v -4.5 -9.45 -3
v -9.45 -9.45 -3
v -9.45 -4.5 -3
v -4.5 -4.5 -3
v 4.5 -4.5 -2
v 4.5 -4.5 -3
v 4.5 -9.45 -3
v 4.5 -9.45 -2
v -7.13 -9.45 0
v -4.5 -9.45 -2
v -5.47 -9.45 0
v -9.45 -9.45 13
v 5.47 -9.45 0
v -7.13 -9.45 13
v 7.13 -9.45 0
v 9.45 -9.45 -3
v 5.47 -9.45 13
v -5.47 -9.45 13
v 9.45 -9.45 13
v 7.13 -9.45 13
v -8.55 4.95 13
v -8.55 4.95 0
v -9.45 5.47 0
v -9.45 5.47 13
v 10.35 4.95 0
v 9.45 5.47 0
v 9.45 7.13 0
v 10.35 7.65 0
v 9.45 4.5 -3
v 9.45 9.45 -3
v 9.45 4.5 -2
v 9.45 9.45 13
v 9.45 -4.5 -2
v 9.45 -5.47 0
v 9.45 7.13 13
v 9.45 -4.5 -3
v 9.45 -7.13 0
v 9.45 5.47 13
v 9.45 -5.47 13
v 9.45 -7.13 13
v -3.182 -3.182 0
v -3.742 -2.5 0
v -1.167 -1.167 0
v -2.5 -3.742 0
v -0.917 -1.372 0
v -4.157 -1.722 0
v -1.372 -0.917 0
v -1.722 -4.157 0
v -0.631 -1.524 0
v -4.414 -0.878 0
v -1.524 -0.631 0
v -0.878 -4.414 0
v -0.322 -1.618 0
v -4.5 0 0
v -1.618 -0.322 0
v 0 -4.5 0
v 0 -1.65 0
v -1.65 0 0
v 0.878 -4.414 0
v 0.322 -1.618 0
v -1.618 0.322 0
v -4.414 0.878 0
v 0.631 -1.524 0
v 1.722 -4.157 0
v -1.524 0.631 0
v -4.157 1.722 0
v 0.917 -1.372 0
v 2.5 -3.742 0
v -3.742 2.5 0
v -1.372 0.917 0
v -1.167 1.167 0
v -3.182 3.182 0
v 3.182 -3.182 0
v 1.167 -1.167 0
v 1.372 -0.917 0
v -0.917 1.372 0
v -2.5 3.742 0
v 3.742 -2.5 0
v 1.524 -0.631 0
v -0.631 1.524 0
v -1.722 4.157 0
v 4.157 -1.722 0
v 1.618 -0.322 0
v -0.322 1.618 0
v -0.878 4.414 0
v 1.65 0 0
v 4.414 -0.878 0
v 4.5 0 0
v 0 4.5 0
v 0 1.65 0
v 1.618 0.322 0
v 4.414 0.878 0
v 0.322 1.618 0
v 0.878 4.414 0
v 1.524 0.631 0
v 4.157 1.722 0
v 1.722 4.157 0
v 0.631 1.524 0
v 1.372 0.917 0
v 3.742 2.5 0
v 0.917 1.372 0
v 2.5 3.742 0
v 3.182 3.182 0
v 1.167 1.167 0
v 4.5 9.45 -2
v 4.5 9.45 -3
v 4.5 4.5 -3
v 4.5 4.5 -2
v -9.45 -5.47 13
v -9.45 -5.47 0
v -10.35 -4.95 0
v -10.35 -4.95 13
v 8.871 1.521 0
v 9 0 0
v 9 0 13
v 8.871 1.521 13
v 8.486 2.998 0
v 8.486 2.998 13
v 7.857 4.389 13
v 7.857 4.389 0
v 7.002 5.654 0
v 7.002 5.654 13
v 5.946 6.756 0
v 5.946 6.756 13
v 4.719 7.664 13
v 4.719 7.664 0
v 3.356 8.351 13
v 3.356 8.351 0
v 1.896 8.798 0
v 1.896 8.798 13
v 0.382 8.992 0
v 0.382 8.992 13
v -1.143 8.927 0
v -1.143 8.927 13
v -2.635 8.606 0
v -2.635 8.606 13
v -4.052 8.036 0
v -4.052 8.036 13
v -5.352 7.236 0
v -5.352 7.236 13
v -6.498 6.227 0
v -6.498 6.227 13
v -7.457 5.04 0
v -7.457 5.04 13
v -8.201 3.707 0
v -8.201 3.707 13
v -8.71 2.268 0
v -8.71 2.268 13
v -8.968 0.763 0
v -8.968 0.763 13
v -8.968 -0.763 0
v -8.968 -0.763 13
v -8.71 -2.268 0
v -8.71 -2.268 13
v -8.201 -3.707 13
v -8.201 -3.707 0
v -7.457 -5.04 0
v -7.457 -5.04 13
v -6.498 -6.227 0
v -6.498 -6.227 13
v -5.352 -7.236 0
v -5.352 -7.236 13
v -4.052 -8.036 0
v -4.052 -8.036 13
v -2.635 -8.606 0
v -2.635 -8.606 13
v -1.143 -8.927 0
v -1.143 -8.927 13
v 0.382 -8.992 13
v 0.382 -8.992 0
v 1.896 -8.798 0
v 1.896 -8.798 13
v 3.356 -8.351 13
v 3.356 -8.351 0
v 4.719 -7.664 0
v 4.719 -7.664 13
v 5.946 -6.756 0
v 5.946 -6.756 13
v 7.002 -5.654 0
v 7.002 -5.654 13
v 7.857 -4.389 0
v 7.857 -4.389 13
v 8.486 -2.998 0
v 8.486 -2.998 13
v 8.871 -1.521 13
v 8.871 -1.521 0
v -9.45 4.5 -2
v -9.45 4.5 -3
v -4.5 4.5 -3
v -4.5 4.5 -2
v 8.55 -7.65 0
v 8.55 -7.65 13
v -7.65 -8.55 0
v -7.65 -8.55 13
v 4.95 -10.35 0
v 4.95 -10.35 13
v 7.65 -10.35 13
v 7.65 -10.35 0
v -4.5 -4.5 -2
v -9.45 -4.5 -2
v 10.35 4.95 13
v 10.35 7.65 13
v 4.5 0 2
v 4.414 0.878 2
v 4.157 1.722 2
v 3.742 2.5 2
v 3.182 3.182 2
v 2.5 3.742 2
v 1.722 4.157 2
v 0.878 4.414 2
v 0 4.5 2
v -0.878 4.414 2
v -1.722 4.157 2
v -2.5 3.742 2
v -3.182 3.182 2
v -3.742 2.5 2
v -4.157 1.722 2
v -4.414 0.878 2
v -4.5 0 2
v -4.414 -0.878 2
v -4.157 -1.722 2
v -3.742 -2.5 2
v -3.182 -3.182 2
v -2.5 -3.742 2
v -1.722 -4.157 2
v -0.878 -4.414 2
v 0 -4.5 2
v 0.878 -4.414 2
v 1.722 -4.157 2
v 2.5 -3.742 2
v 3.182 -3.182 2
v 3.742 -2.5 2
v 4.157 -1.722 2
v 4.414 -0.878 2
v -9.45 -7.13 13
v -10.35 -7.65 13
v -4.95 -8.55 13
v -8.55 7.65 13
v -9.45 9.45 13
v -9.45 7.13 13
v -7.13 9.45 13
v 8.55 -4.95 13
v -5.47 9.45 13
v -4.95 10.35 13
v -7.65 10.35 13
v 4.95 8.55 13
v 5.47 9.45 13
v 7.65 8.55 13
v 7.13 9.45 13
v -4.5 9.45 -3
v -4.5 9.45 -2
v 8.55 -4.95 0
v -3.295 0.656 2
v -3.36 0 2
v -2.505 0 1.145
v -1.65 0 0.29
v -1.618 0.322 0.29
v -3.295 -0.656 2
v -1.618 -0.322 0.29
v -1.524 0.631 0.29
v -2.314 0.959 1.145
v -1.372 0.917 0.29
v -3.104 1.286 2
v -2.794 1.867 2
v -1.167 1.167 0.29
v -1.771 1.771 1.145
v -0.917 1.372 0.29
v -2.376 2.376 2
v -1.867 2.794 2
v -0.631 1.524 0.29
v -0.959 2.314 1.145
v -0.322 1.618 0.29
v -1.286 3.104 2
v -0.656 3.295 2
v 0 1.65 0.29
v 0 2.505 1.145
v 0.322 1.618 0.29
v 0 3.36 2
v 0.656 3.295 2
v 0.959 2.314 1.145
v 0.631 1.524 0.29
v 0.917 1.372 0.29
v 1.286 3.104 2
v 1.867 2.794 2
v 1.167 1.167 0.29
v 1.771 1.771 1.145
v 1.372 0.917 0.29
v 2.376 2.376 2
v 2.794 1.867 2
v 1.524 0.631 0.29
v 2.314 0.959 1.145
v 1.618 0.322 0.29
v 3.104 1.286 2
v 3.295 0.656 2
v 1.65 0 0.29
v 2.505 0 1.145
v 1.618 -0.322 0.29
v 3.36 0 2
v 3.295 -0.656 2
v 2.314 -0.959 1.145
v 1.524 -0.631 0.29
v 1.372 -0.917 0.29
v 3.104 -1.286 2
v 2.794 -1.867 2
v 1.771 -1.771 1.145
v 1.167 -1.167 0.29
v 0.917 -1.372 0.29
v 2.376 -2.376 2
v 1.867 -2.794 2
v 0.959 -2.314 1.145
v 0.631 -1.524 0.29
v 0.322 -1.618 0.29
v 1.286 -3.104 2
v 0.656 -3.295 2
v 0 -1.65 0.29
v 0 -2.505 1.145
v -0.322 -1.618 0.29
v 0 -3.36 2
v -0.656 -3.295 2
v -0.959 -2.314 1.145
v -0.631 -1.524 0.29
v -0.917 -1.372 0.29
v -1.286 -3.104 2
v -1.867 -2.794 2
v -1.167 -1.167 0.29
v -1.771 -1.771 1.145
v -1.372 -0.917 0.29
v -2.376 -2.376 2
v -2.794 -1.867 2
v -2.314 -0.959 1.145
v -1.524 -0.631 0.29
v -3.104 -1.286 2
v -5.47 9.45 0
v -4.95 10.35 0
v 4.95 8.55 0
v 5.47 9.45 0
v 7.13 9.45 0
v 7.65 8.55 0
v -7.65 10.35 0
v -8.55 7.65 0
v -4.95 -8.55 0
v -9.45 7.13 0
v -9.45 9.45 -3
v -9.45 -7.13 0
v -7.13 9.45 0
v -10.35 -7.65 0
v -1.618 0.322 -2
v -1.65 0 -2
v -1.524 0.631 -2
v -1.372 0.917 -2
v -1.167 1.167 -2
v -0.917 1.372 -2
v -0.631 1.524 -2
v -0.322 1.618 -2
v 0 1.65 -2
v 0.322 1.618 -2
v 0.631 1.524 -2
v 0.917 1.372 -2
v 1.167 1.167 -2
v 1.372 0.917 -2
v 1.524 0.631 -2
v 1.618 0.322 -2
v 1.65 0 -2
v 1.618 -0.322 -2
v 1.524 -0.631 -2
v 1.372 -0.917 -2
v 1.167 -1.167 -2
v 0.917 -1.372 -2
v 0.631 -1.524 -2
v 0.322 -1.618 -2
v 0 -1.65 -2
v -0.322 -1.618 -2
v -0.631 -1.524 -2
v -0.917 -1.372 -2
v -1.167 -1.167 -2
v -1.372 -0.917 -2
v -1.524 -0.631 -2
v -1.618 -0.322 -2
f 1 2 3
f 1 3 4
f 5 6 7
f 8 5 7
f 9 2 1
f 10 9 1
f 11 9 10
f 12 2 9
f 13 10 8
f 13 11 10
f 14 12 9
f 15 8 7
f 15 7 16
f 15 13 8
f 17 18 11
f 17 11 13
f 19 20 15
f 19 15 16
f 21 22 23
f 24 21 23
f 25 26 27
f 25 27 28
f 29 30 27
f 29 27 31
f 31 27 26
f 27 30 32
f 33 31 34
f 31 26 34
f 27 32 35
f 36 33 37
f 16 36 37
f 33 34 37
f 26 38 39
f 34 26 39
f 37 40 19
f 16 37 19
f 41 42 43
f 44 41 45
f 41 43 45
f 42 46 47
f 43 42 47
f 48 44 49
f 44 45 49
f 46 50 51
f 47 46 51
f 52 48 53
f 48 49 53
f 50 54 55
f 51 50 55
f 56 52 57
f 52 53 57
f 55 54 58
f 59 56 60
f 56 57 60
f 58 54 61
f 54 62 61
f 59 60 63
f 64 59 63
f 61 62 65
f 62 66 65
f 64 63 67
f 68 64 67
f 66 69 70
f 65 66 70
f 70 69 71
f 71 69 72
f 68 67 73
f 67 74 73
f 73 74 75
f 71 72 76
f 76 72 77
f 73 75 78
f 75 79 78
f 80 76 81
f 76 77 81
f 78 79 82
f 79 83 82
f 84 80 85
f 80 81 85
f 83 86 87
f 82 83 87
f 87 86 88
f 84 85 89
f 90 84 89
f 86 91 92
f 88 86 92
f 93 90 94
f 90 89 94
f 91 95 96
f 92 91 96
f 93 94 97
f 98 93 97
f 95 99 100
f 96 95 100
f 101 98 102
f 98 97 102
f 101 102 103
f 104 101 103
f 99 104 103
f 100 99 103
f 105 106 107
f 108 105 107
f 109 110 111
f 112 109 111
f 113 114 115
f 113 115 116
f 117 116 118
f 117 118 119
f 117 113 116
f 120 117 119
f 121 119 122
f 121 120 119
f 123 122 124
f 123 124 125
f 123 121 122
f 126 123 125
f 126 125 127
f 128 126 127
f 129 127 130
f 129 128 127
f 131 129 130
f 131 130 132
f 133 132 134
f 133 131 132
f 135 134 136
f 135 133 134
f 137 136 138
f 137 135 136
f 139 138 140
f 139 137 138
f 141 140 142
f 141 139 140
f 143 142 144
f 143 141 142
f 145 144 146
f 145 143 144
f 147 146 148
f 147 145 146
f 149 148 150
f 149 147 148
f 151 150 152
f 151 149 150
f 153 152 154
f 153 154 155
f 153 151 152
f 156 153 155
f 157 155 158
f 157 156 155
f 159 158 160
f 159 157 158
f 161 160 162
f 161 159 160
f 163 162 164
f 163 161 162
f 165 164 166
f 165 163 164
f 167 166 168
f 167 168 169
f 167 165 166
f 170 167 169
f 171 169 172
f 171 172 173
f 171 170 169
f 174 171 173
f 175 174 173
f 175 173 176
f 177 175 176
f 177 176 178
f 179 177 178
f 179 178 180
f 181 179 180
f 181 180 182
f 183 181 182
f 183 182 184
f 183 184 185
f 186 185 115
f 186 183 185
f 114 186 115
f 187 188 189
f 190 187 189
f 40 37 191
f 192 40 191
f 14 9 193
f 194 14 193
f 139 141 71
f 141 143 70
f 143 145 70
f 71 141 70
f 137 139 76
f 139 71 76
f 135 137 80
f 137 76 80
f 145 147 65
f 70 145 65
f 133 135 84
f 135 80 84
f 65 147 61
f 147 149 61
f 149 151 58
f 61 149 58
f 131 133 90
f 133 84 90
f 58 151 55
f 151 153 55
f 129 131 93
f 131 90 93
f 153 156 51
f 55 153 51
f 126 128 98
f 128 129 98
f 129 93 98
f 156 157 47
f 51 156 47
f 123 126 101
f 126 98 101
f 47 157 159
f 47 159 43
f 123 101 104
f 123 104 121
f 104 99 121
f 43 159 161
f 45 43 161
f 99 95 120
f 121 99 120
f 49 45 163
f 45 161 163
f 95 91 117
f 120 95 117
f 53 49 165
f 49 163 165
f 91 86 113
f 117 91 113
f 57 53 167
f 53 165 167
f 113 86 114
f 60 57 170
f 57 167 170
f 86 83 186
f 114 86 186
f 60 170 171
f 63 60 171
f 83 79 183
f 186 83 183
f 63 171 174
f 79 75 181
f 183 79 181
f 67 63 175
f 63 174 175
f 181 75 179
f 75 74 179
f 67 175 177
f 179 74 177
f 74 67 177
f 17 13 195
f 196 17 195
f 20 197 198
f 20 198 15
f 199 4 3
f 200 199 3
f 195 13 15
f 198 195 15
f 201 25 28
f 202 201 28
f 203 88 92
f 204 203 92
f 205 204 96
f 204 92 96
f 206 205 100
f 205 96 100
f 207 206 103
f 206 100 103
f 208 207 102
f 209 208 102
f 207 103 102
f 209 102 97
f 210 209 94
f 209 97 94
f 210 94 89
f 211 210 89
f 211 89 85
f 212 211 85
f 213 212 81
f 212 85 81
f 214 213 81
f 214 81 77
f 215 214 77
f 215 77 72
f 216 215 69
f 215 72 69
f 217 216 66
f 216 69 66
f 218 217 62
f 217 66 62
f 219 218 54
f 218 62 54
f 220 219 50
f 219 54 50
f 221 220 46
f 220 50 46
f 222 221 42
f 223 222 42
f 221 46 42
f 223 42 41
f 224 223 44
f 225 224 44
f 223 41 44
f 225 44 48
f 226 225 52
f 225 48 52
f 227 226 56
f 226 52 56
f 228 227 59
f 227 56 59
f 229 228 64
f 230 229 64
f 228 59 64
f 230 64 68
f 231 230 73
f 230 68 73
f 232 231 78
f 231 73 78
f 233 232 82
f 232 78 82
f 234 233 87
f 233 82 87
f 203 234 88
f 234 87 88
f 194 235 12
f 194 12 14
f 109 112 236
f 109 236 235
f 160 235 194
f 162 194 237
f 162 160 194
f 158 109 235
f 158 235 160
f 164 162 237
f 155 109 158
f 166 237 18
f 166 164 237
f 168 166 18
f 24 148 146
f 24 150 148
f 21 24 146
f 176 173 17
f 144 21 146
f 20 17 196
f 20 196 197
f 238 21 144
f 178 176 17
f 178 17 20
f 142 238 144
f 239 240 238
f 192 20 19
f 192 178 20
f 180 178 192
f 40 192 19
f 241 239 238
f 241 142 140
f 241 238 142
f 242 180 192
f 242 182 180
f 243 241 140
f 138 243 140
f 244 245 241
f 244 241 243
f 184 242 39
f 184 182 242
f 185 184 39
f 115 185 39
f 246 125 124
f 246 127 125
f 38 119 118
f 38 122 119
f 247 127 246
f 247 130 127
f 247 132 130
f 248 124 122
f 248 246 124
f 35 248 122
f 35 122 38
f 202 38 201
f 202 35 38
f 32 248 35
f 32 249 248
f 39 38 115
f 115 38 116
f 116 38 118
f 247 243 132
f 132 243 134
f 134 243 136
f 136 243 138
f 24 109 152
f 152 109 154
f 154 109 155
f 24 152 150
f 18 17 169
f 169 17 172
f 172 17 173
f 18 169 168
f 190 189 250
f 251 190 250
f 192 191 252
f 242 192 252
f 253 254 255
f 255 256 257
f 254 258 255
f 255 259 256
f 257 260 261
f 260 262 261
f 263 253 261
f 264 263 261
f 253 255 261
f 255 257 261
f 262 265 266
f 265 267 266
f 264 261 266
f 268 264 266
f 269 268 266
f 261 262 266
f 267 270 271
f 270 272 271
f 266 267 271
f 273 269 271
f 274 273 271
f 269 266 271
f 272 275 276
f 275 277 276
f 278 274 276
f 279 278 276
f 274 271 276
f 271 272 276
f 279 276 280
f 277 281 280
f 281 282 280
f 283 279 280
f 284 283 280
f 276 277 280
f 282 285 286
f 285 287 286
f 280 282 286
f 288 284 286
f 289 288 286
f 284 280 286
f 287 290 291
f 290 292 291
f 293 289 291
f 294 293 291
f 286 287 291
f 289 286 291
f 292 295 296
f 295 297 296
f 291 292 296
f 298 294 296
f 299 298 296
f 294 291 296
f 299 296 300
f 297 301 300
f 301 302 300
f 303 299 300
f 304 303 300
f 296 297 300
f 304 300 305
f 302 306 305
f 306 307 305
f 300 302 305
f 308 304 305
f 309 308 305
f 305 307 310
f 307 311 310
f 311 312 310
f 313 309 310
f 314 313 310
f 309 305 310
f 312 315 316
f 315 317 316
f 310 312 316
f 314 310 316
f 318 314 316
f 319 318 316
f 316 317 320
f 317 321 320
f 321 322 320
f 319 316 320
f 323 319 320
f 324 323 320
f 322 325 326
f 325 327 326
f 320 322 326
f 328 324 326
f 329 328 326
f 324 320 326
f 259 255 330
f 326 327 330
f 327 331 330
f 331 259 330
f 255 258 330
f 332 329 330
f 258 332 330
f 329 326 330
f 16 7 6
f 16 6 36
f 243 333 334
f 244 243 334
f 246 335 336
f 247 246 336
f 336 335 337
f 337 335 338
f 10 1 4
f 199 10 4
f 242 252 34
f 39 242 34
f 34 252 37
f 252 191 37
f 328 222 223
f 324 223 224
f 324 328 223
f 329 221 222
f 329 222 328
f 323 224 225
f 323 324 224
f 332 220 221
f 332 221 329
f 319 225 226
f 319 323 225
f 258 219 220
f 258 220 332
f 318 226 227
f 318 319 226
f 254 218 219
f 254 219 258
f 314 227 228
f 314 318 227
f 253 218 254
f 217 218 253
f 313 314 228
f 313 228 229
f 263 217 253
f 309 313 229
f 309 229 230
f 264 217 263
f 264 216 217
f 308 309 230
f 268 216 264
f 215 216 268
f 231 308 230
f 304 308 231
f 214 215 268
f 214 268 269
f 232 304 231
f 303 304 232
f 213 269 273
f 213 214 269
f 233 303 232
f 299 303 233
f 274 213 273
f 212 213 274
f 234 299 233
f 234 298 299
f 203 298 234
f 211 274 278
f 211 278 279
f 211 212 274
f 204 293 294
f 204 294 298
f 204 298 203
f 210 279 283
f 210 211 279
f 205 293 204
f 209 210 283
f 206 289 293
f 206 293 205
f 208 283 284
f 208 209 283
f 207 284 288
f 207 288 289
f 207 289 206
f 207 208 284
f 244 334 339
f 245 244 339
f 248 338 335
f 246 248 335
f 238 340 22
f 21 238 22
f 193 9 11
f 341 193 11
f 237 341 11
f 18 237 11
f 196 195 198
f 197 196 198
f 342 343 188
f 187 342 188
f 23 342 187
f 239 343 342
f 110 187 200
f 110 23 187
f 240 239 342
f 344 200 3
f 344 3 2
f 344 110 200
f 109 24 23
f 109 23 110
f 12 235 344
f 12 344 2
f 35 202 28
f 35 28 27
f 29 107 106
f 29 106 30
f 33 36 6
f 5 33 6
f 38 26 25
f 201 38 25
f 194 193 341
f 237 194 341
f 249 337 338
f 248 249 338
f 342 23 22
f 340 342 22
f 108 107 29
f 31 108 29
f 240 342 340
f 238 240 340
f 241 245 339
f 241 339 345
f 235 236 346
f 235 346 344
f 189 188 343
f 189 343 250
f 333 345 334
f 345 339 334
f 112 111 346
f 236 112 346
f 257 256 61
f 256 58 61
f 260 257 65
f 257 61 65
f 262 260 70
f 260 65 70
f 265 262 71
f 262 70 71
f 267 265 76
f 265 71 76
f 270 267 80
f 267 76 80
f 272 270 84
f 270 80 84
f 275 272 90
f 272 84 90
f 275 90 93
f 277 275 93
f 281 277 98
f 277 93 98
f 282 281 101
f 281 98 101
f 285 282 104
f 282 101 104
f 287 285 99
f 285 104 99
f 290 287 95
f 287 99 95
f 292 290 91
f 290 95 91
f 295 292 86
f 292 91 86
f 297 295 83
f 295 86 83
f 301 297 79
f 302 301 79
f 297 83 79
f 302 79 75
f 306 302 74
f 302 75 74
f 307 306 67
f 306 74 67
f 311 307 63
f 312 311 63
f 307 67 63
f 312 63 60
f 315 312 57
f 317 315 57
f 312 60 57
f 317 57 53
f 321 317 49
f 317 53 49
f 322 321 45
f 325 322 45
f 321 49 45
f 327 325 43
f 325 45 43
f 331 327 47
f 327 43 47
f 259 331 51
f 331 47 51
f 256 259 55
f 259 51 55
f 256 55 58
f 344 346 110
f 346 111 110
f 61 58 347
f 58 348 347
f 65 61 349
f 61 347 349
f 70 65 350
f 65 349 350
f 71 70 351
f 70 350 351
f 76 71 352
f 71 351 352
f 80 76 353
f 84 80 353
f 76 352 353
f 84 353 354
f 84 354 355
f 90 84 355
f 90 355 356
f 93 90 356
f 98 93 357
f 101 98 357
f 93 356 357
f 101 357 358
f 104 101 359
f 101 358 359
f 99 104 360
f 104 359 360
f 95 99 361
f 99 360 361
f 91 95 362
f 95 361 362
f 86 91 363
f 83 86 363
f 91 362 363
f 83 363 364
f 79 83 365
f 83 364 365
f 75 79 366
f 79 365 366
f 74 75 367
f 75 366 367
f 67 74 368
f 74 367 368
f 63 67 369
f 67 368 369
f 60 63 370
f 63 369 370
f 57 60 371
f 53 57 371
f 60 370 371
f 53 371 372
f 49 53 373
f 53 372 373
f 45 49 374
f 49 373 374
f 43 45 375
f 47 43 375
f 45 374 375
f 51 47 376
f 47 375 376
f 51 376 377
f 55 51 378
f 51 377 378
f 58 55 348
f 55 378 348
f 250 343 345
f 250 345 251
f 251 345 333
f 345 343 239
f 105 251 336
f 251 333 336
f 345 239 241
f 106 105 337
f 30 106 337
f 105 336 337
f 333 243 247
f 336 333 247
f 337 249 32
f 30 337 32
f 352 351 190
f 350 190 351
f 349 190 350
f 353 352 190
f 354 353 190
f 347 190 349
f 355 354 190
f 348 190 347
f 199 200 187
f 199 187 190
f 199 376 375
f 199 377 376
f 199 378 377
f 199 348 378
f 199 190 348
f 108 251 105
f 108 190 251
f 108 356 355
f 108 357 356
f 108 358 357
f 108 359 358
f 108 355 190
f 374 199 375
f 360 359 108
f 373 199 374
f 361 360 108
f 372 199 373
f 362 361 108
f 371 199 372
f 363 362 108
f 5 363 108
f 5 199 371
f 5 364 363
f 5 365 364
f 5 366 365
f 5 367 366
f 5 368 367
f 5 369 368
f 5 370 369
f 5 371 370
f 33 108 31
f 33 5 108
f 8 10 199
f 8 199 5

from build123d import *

# Parameters (mm, degrees)
F1_R              = 9
F2_DEPTH          = 13
F3_W              = 18.9
F3_H              = 18.9
F4_DEPTH          = 3
F5_R              = 4.5
F6_DEPTH          = 2
F8_DEPTH          = 1
F10_D             = 3.3
F10_CSINK_D       = 6.72
F10_CSINK_ANGLE   = 90
F10_2_D           = 3.3
F10_2_CSINK_D     = 6.72
F10_2_CSINK_ANGLE = 90


with BuildPart() as f2:
    # F1 (on Top) → F2 (new body)
    with BuildSketch(Plane.XY):
        Polygon((7.1303847577, -9.45), (9.45, -9.45), (9.45, -7.1303847577), (8.55, -7.65), (8.55, -4.95), (9.45, -5.4696152423), (9.45, 5.4696152423), (10.35, 4.95), (10.35, 7.65), (9.45, 7.1303847577), (9.45, 9.45), (7.1303847577, 9.45), (7.65, 8.55), (4.95, 8.55), (5.4696152423, 9.45), (-5.4696152423, 9.45), (-4.95, 10.35), (-7.65, 10.35), (-7.1303847577, 9.45), (-9.45, 9.45), (-9.45, 7.1303847577), (-8.55, 7.65), (-8.55, 4.95), (-9.45, 5.4696152423), (-9.45, -5.4696152423), (-10.35, -4.95), (-10.35, -7.65), (-9.45, -7.1303847577), (-9.45, -9.45), (-7.1303847577, -9.45), (-7.65, -8.55), (-4.95, -8.55), (-5.4696152423, -9.45), (5.4696152423, -9.45), (4.95, -10.35), (7.65, -10.35), align=None)
        Circle(F1_R, mode=Mode.SUBTRACT)
    extrude(amount=F2_DEPTH)

    # F3 (on face) → F4 (join)
    with BuildSketch(Plane(origin=(0, 0, 0), x_dir=(1, 0, 0), z_dir=(0, 0, -1))):
        Rectangle(F3_W, F3_H)
    extrude(amount=F4_DEPTH)

    # F7 (on face) → F8 (cut)
    with BuildSketch(Plane(origin=(0, 0, -3), x_dir=(1, 0, 0), z_dir=(0, 0, -1))):
        Polygon((-4.5, -9.45), (4.5, -9.45), (4.5, -4.5), (9.45, -4.5), (9.45, 4.5), (4.5, 4.5), (4.5, 9.45), (-4.5, 9.45), (-4.5, 4.5), (-9.45, 4.5), (-9.45, -4.5), (-4.5, -4.5), align=None)
    extrude(amount=-F8_DEPTH, mode=Mode.SUBTRACT)

    # F10 (through all)
    with Locations(Plane.XY.offset(2)):
        with Locations((0, 0)):
            CounterSinkHole(F10_D / 2, F10_CSINK_D / 2, counter_sink_angle=F10_CSINK_ANGLE)


with BuildPart() as f6:
    # F5 (on face) → F6 (new body)
    with BuildSketch(Plane.XY):
        Circle(F5_R)
    extrude(amount=F6_DEPTH)

    # F10#2 (through all)
    with Locations(Plane.XY.offset(2)):
        with Locations((0, 0)):
            CounterSinkHole(F10_2_D / 2, F10_2_CSINK_D / 2, counter_sink_angle=F10_2_CSINK_ANGLE)


solid = Compound([f2.part, f6.part])
